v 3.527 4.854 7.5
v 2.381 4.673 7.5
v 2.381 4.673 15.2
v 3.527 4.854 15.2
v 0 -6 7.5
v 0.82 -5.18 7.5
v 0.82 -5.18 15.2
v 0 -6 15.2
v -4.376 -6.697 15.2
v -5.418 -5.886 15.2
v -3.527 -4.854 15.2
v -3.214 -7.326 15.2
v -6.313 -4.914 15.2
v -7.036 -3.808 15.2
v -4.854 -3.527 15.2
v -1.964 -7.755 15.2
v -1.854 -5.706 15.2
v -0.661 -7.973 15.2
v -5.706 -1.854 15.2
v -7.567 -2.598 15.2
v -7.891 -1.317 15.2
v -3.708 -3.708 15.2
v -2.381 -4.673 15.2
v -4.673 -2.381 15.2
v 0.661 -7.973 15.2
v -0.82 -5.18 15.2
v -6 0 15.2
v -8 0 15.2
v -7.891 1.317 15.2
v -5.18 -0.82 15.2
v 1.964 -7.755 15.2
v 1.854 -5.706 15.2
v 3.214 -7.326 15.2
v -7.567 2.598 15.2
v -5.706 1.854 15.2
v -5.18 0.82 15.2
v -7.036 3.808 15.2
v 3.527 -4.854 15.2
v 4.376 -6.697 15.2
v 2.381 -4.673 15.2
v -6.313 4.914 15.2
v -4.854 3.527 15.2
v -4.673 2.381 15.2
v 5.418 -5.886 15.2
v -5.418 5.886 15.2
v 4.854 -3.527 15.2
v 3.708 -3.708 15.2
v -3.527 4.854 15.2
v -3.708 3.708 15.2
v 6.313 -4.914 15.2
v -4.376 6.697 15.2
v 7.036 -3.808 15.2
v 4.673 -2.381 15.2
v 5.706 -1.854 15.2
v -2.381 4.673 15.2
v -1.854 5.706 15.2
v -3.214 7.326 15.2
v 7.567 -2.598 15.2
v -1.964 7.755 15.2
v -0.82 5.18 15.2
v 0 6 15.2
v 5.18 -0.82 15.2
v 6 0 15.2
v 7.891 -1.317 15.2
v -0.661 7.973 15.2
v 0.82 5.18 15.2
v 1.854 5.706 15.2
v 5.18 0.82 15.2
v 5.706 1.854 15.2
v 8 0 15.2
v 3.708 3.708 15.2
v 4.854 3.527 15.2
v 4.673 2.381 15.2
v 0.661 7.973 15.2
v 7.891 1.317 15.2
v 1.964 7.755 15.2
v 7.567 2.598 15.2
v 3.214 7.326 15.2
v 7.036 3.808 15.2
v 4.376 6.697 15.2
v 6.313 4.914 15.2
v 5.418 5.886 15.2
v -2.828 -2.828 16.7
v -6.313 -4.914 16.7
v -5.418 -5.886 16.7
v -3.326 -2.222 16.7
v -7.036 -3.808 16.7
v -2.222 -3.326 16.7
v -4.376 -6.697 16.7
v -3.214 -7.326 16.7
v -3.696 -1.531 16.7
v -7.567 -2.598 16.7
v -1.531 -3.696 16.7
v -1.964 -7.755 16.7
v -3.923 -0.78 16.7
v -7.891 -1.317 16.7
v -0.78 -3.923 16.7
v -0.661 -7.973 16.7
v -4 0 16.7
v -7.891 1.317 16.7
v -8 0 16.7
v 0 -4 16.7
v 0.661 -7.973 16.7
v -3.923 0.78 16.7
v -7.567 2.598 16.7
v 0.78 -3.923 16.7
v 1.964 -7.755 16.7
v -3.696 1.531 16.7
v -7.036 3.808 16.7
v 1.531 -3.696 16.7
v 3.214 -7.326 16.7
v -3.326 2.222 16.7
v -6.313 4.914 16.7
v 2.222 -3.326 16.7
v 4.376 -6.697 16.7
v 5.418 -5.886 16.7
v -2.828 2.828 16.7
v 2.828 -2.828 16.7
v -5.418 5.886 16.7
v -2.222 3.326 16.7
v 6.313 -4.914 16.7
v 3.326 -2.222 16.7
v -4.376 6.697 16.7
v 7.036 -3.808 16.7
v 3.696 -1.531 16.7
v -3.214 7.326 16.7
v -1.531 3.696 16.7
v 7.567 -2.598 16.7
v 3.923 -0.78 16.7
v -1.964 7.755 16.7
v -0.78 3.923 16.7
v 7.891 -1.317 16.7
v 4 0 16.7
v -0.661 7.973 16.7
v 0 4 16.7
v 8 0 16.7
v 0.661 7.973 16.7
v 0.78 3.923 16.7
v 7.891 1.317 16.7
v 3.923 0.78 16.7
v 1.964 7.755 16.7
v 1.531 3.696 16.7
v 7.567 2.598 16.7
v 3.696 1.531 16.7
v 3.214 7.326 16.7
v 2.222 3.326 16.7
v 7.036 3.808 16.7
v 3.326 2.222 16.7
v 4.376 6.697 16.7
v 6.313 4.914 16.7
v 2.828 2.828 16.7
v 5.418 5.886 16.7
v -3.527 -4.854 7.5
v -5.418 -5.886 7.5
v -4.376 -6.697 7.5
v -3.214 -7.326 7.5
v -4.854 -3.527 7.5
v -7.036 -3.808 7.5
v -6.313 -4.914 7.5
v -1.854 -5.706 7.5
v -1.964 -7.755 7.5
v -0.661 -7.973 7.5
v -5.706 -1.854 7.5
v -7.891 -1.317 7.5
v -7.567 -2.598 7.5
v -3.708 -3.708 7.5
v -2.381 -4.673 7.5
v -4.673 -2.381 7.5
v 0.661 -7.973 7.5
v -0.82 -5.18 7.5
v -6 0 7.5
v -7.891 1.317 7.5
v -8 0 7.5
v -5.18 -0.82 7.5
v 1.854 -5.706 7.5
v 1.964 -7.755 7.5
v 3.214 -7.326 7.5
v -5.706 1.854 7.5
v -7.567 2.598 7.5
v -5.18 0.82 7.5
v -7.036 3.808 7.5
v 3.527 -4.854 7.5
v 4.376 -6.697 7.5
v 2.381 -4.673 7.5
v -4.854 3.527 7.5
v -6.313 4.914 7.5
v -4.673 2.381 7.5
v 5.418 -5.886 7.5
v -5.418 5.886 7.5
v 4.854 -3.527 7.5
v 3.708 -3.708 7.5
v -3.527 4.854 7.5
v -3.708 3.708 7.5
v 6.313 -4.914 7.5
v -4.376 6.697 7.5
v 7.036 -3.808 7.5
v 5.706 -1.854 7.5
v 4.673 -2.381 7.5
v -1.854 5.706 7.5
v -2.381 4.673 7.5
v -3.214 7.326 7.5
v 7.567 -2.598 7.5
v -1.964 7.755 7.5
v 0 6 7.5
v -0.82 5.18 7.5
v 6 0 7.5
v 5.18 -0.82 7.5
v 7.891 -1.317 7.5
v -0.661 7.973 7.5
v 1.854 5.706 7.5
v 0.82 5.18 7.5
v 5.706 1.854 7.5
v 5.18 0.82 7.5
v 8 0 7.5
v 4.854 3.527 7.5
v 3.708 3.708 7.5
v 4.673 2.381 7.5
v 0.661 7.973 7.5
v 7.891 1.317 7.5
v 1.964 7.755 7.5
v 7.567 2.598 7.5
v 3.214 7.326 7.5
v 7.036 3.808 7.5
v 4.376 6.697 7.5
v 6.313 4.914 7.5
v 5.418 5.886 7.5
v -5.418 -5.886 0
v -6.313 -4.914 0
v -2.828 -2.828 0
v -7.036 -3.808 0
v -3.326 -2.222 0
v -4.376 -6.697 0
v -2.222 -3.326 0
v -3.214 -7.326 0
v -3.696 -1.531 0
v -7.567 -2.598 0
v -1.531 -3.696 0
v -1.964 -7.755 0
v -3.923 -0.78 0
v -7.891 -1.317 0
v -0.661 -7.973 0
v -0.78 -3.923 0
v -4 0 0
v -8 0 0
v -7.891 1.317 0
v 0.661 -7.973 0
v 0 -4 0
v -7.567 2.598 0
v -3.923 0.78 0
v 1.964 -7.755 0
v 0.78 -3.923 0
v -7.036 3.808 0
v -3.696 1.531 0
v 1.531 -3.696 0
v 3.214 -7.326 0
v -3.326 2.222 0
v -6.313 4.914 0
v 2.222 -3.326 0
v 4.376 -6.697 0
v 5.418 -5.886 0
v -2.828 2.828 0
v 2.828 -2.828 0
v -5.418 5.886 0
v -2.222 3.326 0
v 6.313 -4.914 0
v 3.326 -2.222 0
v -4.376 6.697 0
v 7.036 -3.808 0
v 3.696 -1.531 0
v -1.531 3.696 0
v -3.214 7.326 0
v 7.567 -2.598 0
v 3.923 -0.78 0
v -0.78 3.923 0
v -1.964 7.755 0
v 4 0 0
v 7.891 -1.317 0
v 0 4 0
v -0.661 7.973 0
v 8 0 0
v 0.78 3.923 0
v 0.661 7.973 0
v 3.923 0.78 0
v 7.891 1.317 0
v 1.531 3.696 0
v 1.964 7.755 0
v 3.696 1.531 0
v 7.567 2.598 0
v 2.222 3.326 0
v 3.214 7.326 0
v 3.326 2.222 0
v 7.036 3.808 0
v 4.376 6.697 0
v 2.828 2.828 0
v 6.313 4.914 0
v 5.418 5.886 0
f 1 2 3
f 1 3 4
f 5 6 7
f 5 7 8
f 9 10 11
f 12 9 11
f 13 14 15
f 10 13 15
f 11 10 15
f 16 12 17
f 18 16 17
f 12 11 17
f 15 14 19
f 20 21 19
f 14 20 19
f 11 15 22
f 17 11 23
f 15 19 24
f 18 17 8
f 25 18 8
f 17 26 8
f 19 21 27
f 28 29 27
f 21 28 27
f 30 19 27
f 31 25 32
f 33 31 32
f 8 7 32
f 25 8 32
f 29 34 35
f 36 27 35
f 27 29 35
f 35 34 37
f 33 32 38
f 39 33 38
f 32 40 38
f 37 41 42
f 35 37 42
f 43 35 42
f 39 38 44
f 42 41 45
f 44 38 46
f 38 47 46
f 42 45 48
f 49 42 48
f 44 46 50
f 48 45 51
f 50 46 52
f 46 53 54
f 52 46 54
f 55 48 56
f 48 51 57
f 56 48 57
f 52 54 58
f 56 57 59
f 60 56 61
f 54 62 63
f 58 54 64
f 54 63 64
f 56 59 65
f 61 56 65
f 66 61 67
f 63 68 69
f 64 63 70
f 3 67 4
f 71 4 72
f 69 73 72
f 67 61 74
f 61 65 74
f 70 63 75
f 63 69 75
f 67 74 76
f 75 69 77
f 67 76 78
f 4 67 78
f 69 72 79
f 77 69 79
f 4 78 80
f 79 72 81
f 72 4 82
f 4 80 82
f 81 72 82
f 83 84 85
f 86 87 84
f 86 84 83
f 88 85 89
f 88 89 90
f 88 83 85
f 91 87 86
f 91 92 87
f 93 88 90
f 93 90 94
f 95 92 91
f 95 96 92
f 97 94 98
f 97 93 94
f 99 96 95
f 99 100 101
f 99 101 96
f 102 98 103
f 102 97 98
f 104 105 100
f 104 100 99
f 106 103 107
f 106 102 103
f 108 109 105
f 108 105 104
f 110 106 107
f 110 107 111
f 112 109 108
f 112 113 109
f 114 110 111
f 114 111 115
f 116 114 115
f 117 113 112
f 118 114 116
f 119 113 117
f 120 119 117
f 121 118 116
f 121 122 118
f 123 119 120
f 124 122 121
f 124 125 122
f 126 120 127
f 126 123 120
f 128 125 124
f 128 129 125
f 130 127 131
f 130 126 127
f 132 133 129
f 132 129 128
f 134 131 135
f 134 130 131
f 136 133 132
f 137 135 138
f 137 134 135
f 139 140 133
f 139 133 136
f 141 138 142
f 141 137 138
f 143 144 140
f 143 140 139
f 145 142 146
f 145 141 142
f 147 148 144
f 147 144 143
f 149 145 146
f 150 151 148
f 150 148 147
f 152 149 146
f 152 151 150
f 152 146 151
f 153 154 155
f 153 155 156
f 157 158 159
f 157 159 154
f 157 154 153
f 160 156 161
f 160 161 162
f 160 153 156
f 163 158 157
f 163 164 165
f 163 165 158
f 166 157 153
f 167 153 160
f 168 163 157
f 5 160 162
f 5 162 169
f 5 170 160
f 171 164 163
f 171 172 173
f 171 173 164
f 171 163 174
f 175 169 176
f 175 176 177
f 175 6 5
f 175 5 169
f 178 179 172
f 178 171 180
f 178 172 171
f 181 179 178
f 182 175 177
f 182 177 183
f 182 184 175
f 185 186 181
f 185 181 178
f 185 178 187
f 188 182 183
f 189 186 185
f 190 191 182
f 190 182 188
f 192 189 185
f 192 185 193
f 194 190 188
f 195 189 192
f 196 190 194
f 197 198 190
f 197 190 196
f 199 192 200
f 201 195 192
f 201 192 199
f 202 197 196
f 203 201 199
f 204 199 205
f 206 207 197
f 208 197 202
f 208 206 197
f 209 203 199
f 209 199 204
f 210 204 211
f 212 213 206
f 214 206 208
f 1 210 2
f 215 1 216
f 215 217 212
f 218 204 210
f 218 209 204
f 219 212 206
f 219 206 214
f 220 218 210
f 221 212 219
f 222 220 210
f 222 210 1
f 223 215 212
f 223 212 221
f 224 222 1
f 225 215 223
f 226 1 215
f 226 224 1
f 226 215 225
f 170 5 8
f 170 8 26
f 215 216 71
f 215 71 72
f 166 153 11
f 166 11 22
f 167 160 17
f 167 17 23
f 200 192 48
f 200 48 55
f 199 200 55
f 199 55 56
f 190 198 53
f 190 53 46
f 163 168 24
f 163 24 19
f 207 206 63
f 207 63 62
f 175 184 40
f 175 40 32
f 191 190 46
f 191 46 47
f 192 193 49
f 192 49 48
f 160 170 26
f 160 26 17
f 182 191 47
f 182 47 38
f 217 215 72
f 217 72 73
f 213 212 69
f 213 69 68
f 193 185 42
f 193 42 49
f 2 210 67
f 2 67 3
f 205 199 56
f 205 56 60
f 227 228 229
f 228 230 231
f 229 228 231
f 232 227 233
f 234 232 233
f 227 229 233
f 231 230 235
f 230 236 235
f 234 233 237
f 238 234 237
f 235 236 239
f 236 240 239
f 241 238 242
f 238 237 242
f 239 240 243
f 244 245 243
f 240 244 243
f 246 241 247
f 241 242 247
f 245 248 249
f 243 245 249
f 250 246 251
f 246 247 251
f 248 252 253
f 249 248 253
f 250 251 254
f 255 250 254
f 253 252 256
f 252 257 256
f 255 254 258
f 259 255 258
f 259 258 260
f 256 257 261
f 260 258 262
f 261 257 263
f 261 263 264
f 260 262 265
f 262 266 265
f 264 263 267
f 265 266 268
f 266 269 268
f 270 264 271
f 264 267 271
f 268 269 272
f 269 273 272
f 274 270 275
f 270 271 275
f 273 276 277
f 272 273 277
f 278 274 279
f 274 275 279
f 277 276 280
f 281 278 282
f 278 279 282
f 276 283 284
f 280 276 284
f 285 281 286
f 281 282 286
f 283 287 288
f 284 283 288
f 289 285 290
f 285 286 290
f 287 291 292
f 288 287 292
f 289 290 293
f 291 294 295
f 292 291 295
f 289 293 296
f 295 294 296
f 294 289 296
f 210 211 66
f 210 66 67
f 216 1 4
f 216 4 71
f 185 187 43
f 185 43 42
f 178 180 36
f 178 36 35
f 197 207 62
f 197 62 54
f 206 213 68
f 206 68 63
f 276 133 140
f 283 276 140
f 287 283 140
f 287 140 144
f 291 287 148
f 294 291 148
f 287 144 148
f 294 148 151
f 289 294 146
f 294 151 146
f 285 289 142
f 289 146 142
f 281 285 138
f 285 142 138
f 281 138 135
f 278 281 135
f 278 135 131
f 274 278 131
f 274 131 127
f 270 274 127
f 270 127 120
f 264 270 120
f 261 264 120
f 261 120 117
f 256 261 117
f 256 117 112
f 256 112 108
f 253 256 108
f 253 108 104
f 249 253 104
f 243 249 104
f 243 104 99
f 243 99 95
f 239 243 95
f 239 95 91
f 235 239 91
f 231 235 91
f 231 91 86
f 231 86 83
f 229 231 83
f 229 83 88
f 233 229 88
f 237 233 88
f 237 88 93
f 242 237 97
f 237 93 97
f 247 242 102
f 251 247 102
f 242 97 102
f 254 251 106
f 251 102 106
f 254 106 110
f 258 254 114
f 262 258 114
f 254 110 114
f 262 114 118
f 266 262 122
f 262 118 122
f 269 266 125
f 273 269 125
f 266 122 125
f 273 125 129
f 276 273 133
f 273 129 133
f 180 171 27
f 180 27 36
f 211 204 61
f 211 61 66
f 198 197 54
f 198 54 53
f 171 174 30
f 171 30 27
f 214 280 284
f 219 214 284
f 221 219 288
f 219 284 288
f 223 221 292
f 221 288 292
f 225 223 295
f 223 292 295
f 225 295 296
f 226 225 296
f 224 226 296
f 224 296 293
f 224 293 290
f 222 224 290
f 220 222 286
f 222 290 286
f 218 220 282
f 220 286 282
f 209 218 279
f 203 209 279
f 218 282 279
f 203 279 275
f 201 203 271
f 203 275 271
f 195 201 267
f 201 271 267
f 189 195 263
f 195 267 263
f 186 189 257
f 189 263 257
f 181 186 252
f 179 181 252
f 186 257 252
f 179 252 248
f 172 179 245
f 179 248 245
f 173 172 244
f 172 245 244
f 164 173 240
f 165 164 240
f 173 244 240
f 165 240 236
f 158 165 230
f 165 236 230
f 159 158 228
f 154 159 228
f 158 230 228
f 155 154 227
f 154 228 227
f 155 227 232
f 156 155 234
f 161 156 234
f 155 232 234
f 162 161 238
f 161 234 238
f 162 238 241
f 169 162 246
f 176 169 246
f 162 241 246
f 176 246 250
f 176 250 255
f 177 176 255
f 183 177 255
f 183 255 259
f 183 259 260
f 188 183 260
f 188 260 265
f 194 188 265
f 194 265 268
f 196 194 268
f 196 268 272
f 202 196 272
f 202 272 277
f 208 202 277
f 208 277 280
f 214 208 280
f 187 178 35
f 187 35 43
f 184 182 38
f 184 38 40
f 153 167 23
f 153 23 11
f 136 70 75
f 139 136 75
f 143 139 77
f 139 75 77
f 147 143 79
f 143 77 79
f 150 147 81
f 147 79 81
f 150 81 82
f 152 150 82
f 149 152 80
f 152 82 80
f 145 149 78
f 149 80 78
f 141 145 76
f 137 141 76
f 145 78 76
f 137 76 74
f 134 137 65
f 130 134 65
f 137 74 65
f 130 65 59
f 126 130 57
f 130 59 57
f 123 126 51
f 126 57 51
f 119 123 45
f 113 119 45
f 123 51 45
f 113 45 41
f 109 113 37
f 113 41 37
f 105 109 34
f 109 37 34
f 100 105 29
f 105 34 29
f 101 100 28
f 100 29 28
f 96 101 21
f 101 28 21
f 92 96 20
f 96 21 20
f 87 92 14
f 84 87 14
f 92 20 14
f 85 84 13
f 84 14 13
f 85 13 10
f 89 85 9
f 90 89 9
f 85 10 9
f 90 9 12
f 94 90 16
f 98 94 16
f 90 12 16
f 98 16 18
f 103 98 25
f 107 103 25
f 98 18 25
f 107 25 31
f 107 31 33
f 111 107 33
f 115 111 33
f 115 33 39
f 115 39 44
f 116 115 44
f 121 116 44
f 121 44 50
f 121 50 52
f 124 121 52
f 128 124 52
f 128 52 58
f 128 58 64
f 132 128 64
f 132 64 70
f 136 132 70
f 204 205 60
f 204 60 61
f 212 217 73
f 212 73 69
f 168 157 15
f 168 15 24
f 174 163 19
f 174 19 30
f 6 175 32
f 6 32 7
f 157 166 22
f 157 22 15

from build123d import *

# Parameters (mm, degrees)
SKETCH1_R           = 8
BOSS_EXTRUDE1_DEPTH = 7.5
BOSS_EXTRUDE2_DEPTH = 7.7
SKETCH3_R           = 8
BOSS_EXTRUDE3_DEPTH = 1.5
SKETCH4_R           = 4
CUT_EXTRUDE2_DEPTH  = 17.5


with BuildPart() as part:
    # Sketch1 → Boss-Extrude1 (new body)
    with BuildSketch(Plane.XY):
        Circle(SKETCH1_R)
    extrude(amount=BOSS_EXTRUDE1_DEPTH)

    # Sketch2 → Boss-Extrude2 (add)
    with BuildSketch(Plane.XY.offset(7.5)):
        Polygon((-0.820372416, 5.179627584), (0, 6), (0.820372416, 5.179627584), (1.854101966, 5.706339098), (2.38081348, 4.672609548), (3.526711514, 4.854101966), (3.708203932, 3.708203933), (4.854101966, 3.526711514), (4.672609548, 2.38081348), (5.706339098, 1.854101966), (5.179627584, 0.820372416), (6, 0), (5.179627584, -0.820372416), (5.706339098, -1.854101966), (4.672609548, -2.38081348), (4.854101966, -3.526711514), (3.708203933, -3.708203932), (3.526711514, -4.854101966), (2.38081348, -4.672609548), (1.854101966, -5.706339098), (0.820372416, -5.179627584), (0, -6), (-0.820372416, -5.179627584), (-1.854101966, -5.706339098), (-2.38081348, -4.672609548), (-3.526711514, -4.854101966), (-3.708203932, -3.708203932), (-4.854101966, -3.526711514), (-4.672609548, -2.38081348), (-5.706339098, -1.854101966), (-5.179627584, -0.820372416), (-6, 0), (-5.179627584, 0.820372416), (-5.706339098, 1.854101966), (-4.672609548, 2.38081348), (-4.854101966, 3.526711514), (-3.708203932, 3.708203932), (-3.526711514, 4.854101966), (-2.38081348, 4.672609548), (-1.854101966, 5.706339098), align=None)
    extrude(amount=BOSS_EXTRUDE2_DEPTH)

    # Sketch3 → Boss-Extrude3 (add)
    with BuildSketch(Plane.XY.offset(15.2)):
        Circle(SKETCH3_R)
    extrude(amount=BOSS_EXTRUDE3_DEPTH)

    # Sketch4 → Cut-Extrude2 (cut)
    with BuildSketch(Plane.XY.offset(16.7)):
        Circle(SKETCH4_R)
    extrude(amount=-CUT_EXTRUDE2_DEPTH, mode=Mode.SUBTRACT)


solid = part.part
